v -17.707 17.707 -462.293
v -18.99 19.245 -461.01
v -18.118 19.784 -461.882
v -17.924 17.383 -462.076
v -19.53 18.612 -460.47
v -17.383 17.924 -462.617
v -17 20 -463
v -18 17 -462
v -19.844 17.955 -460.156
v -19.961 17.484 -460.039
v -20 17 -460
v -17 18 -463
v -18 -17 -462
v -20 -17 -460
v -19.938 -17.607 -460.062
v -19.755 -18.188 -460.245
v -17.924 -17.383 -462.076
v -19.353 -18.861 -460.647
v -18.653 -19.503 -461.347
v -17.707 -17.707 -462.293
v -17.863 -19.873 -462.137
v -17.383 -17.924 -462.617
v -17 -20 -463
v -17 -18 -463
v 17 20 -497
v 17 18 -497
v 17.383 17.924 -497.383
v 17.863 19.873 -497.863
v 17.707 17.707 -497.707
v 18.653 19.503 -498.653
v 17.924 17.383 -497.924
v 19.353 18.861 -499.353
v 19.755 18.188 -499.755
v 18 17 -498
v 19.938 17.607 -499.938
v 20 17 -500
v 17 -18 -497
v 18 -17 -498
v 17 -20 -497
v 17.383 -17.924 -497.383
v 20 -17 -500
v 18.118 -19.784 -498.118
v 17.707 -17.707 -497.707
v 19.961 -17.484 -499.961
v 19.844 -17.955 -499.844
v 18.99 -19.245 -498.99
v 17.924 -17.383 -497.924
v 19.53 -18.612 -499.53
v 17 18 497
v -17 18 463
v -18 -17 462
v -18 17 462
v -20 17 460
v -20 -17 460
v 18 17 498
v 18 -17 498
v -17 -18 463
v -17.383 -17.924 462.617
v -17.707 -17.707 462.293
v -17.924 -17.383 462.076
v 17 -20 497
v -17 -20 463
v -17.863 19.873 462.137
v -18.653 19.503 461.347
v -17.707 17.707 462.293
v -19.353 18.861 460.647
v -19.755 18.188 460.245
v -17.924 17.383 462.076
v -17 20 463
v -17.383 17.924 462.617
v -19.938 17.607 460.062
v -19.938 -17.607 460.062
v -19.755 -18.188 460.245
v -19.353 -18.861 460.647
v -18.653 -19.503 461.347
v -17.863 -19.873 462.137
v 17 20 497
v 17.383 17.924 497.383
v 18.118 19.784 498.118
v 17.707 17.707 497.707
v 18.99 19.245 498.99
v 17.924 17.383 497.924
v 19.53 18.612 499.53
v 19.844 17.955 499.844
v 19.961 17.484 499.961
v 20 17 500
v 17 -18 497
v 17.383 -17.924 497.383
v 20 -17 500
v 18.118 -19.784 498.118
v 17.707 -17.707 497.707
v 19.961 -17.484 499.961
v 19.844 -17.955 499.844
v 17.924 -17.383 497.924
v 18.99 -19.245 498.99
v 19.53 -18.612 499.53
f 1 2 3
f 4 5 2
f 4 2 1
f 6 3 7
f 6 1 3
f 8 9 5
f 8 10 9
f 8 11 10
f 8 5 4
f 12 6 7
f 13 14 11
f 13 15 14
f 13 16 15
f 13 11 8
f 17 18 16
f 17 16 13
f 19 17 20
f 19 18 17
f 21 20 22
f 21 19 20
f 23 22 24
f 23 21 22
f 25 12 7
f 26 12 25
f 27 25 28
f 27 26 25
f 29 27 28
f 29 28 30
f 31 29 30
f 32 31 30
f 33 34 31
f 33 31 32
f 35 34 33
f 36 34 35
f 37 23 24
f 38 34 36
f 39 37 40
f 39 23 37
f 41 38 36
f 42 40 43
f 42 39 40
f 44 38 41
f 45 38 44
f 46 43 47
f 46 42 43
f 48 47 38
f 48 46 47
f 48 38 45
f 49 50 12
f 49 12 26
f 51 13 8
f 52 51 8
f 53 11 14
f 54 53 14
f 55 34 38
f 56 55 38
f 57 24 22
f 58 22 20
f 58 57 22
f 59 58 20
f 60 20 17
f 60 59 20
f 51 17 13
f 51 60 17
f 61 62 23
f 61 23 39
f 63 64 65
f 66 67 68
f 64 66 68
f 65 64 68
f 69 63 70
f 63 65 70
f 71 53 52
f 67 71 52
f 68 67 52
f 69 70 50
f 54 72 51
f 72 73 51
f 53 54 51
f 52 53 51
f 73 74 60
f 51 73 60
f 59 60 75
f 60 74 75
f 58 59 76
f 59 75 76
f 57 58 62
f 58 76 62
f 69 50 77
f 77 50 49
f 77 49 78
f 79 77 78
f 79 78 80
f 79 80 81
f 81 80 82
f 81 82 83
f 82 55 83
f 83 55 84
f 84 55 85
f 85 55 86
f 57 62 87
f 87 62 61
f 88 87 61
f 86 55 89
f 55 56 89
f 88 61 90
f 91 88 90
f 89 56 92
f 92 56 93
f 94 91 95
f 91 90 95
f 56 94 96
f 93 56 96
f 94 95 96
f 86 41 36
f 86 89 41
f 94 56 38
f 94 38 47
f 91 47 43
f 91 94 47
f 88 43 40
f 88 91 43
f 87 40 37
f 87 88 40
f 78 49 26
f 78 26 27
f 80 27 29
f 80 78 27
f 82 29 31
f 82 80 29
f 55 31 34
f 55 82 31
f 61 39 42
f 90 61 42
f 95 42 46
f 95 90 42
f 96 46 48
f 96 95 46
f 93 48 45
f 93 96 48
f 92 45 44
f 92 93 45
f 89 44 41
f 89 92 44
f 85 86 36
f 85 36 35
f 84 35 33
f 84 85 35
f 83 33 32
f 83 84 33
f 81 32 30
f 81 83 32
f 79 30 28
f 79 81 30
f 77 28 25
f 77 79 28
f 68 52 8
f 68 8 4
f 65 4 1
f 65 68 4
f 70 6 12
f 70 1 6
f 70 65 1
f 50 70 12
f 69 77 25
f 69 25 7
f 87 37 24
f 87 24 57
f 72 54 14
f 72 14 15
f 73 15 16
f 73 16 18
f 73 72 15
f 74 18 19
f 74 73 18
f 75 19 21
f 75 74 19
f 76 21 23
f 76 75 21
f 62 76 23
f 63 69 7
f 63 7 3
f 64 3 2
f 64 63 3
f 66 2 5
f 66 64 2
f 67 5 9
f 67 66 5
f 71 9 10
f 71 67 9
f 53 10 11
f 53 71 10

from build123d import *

# Parameters (mm, degrees)
F1_DEPTH      = 500
F3_DEPTH      = 20.001
F3_DEPTH_BACK = 20.001


# Not quite as in the source:
# - a pattern or mirror of a feature is missing from the dataset's text; its kind, count and spacing are read off the source's solid


with BuildPart() as f1:
    # F0 (on Top) → F1 (new body, symmetric)
    with BuildSketch(Plane.XY):
        with BuildLine():
            Line((17, 20), (-17, 20))
            ThreePointArc((-17, 20), (-19.1213203436, 19.1213203436), (-20, 17))
            Line((-20, 17), (-20, -17))
            ThreePointArc((-20, -17), (-19.1213203436, -19.1213203436), (-17, -20))
            Line((-17, -20), (17, -20))
            ThreePointArc((17, -20), (19.1213203436, -19.1213203436), (20, -17))
            Line((20, -17), (20, 17))
            ThreePointArc((20, 17), (19.1213203436, 19.1213203436), (17, 20))
        make_face()
        with BuildLine():
            ThreePointArc((-18, 17), (-17.7071067812, 17.7071067812), (-17, 18))
            Line((-17, 18), (17, 18))
            ThreePointArc((17, 18), (17.7071067812, 17.7071067812), (18, 17))
            Line((18, 17), (18, -17))
            ThreePointArc((18, -17), (17.7071067812, -17.7071067812), (17, -18))
            Line((17, -18), (-17, -18))
            ThreePointArc((-17, -18), (-17.7071067812, -17.7071067812), (-18, -17))
            Line((-18, -17), (-18, 17))
        make_face(mode=Mode.SUBTRACT)
    extrude(amount=F1_DEPTH, both=True)

    # F2 (on Front) → F3 (cut, two sides)
    with BuildSketch(Plane.XZ) as f3_sk:
        Polygon((20, 500), (-20, 500), (-20, 460), align=None)
    f3 = extrude(amount=-F3_DEPTH, mode=Mode.SUBTRACT) + extrude(f3_sk.sketch, amount=F3_DEPTH_BACK, mode=Mode.SUBTRACT)

    # F3_copies: F3 across plane
    add(f3.mirror(Plane(origin=(0, 0, 0), x_dir=(-1, 0, 0), z_dir=(0, 0, -1))), mode=Mode.SUBTRACT)


solid = f1.part
